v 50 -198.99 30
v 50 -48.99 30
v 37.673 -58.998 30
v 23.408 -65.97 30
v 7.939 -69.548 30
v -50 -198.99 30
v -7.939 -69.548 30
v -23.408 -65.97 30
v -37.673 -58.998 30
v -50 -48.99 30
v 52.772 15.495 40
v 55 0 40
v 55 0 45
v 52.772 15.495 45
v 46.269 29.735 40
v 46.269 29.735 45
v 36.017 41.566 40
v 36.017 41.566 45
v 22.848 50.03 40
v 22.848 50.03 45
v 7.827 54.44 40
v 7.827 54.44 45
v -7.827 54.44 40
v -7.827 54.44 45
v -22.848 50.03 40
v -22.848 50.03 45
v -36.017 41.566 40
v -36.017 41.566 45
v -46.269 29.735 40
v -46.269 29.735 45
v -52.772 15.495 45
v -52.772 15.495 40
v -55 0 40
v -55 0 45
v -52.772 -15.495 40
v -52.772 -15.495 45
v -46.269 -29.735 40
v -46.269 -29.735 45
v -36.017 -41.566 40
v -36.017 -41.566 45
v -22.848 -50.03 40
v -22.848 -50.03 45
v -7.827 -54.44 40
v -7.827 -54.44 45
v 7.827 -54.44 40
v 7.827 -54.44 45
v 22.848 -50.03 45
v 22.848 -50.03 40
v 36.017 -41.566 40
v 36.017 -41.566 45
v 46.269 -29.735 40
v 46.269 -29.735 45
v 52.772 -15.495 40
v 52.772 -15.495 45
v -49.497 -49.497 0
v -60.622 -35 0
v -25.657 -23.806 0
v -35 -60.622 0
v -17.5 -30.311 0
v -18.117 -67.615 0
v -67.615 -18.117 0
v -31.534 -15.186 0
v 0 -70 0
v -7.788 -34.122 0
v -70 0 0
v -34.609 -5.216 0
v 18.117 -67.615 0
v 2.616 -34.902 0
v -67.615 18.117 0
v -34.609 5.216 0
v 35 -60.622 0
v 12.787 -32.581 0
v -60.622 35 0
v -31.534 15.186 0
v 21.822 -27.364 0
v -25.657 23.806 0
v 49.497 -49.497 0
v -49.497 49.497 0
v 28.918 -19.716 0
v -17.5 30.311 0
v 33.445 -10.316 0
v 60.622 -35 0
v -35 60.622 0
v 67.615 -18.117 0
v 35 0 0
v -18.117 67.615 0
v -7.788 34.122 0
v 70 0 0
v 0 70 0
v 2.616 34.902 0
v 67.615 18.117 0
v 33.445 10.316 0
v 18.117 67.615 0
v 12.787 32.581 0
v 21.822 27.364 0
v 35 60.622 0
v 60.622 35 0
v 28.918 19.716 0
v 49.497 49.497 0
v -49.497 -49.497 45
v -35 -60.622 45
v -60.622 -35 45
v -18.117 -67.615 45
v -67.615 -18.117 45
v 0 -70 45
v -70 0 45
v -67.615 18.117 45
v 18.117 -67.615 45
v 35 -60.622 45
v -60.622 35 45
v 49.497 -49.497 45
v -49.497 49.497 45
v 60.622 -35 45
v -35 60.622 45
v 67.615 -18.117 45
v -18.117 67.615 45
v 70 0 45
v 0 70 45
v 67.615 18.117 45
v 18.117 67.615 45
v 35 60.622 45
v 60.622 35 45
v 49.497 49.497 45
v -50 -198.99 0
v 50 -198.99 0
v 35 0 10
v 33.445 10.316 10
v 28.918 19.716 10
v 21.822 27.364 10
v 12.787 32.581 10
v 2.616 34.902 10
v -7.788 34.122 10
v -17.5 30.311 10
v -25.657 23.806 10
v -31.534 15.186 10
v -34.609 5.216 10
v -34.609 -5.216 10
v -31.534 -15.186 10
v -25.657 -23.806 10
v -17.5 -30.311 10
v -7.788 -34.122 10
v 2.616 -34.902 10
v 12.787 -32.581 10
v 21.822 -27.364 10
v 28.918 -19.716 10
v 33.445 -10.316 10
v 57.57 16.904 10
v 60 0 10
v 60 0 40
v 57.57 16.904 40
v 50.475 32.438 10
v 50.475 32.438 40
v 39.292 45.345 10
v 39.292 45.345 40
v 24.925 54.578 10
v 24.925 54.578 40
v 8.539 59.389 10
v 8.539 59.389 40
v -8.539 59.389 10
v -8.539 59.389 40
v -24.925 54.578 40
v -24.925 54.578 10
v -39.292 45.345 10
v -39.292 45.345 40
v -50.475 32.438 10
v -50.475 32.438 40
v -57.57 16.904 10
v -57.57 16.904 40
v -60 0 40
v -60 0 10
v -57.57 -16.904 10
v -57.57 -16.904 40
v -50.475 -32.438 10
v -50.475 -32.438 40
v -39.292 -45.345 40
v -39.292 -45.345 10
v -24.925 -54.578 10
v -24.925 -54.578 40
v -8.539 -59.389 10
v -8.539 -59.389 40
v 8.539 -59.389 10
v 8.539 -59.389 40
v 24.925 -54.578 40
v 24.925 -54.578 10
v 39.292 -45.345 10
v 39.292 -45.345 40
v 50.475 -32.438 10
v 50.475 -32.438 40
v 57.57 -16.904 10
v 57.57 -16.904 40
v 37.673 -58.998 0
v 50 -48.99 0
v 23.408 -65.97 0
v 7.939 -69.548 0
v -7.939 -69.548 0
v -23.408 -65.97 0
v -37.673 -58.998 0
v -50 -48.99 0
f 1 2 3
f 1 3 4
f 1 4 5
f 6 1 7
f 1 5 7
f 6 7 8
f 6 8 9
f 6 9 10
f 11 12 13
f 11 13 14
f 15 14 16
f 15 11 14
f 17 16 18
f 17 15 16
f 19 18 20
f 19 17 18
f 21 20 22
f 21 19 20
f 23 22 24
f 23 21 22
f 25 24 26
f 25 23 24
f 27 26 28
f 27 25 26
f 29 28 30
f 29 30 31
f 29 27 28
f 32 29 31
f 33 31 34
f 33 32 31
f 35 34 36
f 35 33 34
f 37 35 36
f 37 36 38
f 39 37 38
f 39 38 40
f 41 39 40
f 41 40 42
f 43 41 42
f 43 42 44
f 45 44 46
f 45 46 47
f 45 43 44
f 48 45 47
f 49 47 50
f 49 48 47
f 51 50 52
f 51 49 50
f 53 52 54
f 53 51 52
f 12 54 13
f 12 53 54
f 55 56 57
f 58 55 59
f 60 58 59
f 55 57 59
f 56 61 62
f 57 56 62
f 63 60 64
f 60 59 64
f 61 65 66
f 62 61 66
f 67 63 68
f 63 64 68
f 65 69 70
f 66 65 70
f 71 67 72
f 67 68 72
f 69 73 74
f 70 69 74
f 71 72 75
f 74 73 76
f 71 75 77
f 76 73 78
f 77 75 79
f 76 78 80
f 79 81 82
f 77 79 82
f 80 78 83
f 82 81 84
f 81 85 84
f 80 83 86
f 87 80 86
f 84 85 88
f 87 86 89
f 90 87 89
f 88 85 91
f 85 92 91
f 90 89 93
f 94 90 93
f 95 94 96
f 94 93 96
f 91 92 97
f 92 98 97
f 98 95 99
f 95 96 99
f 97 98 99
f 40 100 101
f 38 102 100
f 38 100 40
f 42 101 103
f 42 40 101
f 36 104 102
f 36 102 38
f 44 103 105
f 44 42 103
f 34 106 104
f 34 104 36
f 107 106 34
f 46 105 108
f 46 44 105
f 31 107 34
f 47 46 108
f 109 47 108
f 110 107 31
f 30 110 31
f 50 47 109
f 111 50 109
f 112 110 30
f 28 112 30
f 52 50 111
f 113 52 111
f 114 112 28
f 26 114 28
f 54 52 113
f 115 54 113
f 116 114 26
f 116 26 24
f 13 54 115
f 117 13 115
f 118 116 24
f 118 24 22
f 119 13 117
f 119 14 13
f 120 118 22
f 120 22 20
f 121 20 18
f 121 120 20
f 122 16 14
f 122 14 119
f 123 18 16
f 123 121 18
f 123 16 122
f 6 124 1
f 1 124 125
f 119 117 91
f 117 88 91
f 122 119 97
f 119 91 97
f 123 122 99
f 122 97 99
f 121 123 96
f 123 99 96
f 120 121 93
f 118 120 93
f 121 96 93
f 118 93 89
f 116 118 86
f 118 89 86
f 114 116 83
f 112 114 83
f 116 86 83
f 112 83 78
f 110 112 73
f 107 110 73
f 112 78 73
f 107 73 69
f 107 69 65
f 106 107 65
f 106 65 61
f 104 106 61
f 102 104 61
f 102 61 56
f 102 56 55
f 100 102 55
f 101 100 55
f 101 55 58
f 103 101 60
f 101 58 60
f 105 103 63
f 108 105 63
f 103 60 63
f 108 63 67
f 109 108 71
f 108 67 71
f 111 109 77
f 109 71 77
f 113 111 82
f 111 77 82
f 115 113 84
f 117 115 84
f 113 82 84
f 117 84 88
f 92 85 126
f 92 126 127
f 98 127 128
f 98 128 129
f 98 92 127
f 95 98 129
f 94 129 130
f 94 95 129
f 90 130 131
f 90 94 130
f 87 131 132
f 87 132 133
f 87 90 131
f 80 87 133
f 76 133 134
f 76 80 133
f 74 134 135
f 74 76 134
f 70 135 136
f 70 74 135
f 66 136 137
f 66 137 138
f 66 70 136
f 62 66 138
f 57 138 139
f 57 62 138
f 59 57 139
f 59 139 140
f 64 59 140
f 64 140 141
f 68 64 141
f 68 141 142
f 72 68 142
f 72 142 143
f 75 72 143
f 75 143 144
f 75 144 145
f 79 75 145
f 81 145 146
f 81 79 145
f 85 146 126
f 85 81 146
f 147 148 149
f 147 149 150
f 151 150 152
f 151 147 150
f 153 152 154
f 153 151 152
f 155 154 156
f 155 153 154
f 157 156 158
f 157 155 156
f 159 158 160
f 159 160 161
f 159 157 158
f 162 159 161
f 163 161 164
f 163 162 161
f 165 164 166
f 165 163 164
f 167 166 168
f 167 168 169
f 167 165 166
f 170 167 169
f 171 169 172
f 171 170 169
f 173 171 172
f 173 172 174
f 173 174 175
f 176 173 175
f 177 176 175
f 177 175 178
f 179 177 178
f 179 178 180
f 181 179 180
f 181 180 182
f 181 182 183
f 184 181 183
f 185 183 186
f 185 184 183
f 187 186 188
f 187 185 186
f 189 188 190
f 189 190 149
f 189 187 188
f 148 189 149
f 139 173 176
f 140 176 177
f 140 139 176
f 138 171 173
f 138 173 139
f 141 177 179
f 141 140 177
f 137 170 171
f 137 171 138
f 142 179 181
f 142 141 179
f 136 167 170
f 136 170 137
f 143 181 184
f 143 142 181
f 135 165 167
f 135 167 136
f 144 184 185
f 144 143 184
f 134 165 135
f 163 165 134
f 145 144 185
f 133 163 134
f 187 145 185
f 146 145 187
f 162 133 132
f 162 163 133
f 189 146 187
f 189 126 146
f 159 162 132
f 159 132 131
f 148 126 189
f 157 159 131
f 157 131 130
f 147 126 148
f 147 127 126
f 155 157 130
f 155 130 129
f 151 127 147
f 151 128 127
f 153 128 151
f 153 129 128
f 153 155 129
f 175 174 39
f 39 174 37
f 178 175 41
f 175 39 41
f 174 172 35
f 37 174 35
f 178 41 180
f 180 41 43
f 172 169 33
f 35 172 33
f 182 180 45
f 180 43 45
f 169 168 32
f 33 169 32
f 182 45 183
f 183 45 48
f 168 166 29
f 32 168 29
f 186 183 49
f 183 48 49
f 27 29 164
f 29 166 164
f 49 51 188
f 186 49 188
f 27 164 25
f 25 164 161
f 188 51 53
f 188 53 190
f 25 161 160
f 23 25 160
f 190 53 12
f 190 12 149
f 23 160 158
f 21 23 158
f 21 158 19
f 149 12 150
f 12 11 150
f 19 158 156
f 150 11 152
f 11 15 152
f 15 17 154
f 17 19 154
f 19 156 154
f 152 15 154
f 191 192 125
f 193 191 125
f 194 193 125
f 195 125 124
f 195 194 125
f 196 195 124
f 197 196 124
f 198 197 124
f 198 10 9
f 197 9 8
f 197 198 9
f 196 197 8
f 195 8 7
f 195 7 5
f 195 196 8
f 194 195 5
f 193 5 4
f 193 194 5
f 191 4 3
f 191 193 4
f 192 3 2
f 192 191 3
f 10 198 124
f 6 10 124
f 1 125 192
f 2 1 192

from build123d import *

# Parameters (mm, degrees)
SKETCH_R      = 70
SKETCH_R_2    = 35
PAD_DEPTH     = 10
SKETCH001_R   = 70
SKETCH001_R_2 = 60
PAD001_DEPTH  = 30
SKETCH002_R   = 70
SKETCH002_R_2 = 55
PAD002_DEPTH  = 5
PAD003_DEPTH  = 30


with BuildPart() as block:
    # Sketch → Pad (new body)
    with BuildSketch(Plane.XY):
        Circle(SKETCH_R)
        Circle(SKETCH_R_2, mode=Mode.SUBTRACT)
    extrude(amount=PAD_DEPTH)

    # Sketch001 → Pad001 (new body)
    with BuildSketch(Plane.XY.offset(10)):
        Circle(SKETCH001_R)
        Circle(SKETCH001_R_2, mode=Mode.SUBTRACT)
    extrude(amount=PAD001_DEPTH)

    # Sketch002 → Pad002 (new body)
    with BuildSketch(Plane.XY.offset(40)):
        Circle(SKETCH002_R)
        Circle(SKETCH002_R_2, mode=Mode.SUBTRACT)
    extrude(amount=PAD002_DEPTH)


with BuildPart() as barm:
    # Sketch003 → Pad003 (new body)
    with BuildSketch(Plane.XY):
        with BuildLine():
            ThreePointArc((-50, -48.989795), (0, -70), (50, -48.989795))
            Line((50, -198.989795), (50, -48.989795))
            Line((-50, -198.989795), (50, -198.989795))
            Line((-50, -48.989795), (-50, -198.989795))
        make_face()
    extrude(amount=PAD003_DEPTH)


solid = Compound([block.part, barm.part])
